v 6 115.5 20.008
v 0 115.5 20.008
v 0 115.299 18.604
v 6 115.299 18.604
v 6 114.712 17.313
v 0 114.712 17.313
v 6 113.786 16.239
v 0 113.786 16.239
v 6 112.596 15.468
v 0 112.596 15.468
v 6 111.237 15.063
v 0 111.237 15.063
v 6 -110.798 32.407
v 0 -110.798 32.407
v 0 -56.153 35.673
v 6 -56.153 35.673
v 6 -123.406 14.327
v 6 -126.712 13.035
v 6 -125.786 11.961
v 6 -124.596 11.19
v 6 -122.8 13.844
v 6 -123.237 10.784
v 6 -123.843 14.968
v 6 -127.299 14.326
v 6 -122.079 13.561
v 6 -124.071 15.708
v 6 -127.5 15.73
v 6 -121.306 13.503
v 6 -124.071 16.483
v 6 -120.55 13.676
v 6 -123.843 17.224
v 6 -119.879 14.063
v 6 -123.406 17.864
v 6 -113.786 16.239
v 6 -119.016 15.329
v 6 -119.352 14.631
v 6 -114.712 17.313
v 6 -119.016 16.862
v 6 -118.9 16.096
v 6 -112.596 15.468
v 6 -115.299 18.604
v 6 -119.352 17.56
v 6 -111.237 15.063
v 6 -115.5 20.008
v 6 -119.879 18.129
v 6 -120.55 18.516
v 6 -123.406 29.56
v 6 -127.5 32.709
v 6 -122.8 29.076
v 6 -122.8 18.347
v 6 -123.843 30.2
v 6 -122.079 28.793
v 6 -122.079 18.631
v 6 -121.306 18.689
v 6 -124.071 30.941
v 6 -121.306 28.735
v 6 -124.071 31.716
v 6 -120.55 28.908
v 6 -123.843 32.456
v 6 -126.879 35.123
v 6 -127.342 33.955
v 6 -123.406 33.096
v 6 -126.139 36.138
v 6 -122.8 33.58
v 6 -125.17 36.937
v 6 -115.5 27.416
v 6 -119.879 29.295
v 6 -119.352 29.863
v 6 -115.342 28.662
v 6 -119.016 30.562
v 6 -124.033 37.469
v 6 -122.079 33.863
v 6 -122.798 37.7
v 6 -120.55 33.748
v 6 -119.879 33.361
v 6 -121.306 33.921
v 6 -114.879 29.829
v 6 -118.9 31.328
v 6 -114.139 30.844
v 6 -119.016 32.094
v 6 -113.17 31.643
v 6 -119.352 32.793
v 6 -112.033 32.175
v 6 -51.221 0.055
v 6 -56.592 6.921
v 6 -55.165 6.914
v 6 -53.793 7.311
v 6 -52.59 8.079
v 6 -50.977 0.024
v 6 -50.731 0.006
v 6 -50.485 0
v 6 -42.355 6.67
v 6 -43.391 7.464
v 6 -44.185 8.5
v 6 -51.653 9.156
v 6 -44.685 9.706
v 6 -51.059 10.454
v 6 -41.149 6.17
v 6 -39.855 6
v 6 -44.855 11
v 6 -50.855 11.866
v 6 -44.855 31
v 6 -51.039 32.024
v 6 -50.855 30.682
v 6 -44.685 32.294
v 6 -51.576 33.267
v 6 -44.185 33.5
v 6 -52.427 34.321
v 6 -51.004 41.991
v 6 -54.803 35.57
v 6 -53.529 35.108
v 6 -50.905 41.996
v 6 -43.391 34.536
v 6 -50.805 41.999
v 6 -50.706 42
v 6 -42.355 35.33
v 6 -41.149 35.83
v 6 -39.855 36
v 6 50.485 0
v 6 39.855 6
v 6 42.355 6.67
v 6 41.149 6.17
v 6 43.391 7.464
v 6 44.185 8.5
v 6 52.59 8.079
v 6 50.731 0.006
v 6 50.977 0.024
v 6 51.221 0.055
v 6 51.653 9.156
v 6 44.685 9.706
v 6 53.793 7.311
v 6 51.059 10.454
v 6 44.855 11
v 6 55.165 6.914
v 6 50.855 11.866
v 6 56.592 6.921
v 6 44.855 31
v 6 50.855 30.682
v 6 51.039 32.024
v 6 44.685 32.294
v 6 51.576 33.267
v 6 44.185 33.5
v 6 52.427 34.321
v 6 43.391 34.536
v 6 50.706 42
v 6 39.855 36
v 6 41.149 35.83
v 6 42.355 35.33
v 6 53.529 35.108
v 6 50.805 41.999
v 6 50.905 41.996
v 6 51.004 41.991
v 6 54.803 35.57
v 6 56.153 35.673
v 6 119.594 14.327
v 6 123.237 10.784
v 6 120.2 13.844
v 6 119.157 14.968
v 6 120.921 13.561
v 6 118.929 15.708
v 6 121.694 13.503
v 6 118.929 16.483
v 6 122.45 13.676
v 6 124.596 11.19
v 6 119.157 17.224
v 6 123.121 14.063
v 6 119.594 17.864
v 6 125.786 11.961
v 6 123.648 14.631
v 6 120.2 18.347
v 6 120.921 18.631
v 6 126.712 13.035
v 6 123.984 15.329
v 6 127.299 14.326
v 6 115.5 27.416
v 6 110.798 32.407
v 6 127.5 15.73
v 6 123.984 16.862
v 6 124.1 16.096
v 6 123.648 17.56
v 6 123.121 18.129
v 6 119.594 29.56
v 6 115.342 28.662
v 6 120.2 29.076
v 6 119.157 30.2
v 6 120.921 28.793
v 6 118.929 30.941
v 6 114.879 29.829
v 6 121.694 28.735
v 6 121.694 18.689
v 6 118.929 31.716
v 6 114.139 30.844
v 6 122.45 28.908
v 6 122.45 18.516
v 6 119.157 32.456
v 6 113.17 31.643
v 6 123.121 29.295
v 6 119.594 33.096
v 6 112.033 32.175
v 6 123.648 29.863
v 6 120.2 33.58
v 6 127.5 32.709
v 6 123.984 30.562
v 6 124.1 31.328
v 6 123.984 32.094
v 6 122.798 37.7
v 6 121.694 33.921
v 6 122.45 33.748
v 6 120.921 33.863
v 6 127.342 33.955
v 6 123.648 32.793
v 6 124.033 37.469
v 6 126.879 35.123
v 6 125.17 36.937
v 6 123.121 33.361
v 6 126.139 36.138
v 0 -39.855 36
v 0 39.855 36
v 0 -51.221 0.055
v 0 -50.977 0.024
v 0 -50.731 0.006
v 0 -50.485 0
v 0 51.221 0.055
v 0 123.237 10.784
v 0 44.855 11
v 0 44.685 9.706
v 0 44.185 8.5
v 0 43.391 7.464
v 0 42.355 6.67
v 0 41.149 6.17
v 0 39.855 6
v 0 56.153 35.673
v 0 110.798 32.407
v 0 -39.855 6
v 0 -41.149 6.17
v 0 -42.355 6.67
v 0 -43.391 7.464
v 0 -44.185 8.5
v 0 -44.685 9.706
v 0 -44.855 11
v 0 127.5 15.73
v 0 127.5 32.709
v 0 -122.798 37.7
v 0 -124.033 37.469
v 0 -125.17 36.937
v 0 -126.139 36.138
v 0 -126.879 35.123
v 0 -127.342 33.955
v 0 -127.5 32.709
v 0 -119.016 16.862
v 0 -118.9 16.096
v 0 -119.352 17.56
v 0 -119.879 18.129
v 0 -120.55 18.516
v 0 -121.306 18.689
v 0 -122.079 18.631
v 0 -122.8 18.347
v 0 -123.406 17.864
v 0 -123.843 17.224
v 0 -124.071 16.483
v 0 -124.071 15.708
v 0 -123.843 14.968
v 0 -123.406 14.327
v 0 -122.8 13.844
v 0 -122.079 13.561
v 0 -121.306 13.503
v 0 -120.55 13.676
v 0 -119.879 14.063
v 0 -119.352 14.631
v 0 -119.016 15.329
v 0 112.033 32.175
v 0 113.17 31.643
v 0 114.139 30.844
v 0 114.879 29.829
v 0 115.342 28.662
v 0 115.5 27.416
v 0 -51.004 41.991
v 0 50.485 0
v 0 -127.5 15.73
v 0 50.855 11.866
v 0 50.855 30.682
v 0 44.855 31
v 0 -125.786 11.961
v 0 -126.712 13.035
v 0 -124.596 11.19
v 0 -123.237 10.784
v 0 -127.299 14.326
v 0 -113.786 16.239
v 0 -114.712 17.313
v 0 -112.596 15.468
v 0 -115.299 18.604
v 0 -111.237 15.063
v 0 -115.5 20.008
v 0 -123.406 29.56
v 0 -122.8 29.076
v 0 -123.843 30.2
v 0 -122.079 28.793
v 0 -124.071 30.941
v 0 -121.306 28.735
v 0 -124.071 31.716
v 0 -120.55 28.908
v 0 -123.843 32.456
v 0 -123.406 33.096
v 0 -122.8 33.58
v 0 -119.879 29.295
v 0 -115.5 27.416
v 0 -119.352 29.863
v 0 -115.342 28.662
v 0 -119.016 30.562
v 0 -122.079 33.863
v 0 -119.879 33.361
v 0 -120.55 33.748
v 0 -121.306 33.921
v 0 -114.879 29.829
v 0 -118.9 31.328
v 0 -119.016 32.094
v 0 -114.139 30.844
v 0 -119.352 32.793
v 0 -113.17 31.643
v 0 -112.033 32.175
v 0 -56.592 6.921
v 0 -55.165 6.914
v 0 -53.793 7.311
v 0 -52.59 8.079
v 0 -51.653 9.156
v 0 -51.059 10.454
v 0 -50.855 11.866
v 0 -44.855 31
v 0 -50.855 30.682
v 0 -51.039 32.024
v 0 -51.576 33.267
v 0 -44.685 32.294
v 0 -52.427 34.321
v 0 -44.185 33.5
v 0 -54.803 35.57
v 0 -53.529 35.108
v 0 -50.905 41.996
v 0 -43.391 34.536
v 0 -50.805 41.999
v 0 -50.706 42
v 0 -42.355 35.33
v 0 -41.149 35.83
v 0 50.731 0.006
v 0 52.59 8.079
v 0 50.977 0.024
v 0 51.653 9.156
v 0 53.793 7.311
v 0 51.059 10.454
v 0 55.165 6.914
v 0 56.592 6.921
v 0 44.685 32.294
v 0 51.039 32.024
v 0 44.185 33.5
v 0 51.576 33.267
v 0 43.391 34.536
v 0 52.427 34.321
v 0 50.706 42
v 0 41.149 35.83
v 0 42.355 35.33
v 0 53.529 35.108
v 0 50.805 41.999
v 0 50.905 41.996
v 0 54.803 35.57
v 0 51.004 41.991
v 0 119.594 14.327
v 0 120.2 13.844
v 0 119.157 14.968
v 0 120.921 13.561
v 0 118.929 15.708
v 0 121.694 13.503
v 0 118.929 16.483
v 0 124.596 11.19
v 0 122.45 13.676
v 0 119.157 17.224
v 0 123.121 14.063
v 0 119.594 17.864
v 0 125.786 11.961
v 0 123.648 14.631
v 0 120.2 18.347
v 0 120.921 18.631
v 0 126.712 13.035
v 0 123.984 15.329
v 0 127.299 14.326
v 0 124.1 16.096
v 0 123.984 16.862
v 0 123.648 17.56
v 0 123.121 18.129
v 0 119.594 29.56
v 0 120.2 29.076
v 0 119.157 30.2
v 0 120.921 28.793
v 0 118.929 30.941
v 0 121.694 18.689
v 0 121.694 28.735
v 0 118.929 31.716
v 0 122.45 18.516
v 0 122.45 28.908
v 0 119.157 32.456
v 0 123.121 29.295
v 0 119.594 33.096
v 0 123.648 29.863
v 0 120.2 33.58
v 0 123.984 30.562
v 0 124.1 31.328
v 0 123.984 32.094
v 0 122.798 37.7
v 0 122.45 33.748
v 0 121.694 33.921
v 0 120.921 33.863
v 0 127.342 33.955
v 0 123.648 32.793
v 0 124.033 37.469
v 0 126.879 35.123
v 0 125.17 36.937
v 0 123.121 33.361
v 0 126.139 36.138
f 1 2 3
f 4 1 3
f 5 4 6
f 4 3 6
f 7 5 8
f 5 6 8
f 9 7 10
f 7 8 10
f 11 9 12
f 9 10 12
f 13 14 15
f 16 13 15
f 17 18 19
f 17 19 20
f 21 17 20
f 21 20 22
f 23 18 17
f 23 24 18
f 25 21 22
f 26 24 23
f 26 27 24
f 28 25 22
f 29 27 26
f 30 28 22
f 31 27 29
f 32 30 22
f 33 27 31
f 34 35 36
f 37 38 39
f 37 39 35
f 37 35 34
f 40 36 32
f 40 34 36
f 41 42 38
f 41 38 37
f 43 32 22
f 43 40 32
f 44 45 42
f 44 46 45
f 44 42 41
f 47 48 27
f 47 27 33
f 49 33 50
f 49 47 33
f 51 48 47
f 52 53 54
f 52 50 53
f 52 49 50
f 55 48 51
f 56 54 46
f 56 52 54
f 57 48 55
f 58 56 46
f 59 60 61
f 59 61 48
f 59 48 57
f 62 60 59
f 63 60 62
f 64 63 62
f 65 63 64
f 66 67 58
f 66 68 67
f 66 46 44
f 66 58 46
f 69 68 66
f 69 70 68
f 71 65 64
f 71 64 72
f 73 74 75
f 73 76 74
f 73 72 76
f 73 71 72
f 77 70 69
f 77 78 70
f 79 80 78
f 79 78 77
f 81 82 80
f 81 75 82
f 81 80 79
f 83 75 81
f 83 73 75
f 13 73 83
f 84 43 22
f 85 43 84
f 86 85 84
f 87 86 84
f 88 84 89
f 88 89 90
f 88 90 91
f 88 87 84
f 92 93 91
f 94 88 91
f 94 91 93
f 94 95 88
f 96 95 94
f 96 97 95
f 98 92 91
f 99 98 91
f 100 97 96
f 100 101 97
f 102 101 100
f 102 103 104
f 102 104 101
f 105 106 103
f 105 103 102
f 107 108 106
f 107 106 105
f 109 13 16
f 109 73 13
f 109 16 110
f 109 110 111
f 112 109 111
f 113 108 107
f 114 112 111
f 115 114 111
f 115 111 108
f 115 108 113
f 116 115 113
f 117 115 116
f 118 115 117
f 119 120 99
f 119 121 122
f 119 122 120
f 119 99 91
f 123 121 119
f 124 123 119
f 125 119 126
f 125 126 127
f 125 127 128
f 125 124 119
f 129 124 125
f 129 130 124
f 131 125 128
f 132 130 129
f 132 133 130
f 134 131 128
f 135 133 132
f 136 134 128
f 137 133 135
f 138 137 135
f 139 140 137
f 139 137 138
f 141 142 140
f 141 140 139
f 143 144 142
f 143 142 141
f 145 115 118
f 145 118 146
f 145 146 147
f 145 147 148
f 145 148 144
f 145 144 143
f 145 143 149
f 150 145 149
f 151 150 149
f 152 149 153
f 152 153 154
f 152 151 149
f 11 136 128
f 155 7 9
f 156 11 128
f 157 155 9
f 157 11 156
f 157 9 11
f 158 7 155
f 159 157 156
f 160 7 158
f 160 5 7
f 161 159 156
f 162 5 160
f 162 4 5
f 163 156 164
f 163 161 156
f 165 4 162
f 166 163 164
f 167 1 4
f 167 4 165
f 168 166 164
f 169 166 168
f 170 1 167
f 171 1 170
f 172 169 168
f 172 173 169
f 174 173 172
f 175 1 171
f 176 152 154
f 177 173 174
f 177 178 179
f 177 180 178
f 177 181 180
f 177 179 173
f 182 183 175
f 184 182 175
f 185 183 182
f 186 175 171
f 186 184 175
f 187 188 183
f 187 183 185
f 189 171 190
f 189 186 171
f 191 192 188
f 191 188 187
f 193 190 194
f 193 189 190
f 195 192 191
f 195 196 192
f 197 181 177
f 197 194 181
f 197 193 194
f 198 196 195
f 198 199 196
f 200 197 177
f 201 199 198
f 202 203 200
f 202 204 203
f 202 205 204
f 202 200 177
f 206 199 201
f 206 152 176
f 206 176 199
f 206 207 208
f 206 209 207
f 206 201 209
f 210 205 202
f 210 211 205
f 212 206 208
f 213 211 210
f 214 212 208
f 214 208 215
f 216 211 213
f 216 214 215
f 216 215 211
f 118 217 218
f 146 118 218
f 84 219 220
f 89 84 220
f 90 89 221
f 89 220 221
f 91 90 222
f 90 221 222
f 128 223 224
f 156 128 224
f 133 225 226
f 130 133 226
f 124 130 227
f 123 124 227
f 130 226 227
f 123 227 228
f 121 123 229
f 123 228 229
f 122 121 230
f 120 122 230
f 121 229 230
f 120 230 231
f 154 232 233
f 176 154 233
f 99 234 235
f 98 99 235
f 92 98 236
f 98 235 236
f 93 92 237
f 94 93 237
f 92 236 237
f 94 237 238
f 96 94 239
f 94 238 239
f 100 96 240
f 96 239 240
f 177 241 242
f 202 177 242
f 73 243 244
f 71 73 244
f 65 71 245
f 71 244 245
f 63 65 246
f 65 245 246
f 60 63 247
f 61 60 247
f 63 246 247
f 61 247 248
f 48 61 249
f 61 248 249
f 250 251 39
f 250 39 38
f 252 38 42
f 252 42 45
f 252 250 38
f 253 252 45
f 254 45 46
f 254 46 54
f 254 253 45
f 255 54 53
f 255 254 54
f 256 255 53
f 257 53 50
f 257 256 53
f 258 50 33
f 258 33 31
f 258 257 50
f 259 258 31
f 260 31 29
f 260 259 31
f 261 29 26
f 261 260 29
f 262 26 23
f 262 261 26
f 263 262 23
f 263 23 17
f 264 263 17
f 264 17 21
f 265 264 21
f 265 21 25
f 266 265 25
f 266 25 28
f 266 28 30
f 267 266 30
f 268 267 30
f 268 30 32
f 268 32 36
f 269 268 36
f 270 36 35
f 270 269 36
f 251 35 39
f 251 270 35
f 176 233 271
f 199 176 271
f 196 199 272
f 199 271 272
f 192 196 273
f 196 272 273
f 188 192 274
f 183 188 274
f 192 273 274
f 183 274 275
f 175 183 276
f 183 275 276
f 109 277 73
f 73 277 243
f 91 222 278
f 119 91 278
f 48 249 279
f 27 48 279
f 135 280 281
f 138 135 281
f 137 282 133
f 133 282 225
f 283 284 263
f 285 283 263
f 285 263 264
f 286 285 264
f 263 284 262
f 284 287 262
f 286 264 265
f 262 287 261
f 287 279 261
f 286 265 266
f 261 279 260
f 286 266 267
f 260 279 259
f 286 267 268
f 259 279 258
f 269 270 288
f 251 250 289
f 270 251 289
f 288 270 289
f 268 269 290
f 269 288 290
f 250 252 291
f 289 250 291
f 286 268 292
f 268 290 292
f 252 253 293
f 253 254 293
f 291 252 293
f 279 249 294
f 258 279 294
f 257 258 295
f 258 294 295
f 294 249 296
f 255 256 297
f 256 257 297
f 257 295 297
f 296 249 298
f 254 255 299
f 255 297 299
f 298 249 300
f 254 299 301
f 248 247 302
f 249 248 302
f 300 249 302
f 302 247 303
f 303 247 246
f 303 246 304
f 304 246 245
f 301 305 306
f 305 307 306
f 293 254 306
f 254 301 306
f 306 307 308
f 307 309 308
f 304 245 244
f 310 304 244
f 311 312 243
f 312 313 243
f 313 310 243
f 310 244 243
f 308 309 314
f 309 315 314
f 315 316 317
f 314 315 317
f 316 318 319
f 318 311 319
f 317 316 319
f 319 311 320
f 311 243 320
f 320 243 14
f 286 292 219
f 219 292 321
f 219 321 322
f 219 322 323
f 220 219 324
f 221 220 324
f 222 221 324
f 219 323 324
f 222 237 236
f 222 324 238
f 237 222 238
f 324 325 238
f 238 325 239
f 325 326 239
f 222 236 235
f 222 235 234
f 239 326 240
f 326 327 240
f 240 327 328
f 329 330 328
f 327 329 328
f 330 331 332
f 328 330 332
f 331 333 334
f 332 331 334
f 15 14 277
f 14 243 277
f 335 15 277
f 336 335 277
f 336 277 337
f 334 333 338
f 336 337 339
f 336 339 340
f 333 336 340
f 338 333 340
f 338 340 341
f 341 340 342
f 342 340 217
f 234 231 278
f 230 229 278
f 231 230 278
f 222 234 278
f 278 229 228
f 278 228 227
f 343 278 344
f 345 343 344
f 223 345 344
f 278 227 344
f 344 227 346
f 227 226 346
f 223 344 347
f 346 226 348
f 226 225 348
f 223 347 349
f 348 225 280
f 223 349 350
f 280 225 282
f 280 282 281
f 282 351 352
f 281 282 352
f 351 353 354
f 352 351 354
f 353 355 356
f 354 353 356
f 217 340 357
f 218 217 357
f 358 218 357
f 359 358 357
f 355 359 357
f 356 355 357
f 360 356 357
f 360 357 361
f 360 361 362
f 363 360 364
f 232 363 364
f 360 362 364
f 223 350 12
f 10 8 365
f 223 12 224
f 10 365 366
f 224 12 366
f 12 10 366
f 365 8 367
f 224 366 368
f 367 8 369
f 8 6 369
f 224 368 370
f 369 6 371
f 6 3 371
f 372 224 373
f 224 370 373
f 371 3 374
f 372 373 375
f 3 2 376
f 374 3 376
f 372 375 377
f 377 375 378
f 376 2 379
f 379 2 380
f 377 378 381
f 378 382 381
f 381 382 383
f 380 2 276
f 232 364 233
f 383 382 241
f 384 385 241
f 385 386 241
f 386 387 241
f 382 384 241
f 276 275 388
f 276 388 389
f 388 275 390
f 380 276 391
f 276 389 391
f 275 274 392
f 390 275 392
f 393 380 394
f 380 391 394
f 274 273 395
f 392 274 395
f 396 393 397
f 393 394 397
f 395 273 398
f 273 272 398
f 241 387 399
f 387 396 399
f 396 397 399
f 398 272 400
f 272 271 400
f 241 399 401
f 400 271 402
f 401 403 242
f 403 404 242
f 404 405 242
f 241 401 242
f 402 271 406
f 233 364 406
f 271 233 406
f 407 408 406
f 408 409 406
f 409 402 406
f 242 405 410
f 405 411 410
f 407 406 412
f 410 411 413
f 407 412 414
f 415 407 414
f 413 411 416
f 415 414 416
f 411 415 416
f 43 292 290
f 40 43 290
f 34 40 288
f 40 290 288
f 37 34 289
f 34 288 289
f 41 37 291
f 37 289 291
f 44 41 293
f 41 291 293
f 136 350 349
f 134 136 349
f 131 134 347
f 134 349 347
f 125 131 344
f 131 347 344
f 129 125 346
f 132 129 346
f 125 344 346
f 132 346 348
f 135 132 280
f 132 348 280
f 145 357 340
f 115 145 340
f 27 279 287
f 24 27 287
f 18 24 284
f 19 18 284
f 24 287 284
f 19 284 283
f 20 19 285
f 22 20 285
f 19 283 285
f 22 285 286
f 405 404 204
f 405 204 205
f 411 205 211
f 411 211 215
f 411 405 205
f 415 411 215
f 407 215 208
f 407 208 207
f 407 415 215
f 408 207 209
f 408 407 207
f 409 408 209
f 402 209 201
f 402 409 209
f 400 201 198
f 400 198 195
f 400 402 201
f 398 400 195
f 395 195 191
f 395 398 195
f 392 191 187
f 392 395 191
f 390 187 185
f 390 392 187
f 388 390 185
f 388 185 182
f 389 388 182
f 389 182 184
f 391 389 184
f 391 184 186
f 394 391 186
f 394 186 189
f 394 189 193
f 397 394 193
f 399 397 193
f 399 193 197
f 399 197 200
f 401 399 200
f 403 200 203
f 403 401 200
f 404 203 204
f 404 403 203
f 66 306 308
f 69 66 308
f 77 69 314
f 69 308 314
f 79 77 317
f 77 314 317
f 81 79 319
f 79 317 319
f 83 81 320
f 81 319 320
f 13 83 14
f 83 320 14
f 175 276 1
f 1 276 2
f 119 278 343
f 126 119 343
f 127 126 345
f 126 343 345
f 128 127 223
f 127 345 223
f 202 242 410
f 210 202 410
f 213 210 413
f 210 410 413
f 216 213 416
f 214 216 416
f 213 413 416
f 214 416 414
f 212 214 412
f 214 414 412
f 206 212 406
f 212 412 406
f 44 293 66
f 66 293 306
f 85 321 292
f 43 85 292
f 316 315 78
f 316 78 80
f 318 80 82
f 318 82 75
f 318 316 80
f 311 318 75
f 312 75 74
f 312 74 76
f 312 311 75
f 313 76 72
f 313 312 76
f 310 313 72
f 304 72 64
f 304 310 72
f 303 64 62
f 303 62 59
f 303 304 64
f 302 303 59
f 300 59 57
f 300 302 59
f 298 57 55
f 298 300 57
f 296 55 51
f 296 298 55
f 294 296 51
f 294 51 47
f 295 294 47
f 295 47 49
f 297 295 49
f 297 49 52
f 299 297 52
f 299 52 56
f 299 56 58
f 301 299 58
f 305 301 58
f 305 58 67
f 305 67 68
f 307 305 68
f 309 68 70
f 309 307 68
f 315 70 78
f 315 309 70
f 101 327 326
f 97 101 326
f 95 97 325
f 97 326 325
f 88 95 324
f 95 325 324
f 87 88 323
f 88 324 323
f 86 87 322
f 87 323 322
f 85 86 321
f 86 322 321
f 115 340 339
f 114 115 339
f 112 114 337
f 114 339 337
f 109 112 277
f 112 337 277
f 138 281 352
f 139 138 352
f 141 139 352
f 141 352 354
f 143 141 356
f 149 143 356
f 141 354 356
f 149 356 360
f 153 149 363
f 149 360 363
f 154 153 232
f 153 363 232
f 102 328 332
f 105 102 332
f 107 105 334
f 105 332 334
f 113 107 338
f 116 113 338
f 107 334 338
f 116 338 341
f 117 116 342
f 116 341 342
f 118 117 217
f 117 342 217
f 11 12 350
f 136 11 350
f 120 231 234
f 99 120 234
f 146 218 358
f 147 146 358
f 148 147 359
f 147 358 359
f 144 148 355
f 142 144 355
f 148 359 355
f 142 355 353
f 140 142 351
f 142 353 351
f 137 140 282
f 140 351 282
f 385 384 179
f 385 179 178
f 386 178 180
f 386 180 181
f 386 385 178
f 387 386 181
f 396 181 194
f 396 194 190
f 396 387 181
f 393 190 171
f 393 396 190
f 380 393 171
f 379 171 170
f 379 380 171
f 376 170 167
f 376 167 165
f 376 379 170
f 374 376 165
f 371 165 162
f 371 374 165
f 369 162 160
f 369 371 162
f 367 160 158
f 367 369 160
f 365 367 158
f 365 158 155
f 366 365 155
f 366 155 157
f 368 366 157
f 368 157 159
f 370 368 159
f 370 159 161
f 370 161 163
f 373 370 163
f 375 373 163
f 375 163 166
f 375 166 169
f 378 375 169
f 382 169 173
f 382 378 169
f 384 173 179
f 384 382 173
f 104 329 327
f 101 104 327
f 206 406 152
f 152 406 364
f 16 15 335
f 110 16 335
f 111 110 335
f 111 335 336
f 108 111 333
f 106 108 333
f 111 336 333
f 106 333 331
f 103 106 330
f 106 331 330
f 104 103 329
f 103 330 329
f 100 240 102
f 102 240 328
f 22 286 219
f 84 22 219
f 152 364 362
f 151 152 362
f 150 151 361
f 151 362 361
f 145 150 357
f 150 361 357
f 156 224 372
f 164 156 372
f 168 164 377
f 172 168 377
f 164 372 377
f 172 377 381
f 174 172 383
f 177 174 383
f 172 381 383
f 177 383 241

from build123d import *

# Parameters (mm, degrees)
F0_R     = 2.6
F1_DEPTH = 6


with BuildPart() as f1:
    # F0 (on Right) → F1 (new body)
    with BuildSketch(Plane.YZ):
        with BuildLine():
            Line((-50.484604, 0), (0, 0))
            Line((0, 0), (50.484604, 0))
            ThreePointArc((50.484604, 0), (50.854025, 0.013666), (51.221427, 0.054589))
            Line((51.221427, 0.054589), (123.236823, 10.784256))
            ThreePointArc((123.236823, 10.784256), (126.287091, 12.465017), (127.5, 15.729667))
            Line((127.5, 15.729667), (127.5, 32.709328))
            ThreePointArc((127.5, 32.709328), (126.139466, 36.137781), (122.798285, 37.700423))
            Line((122.798285, 37.700423), (51.004047, 41.991095))
            ThreePointArc((51.004047, 41.991095), (50.854971, 41.997773), (50.705762, 42))
            Line((50.705762, 42), (39.15917, 42))
            Line((39.15917, 42), (-39.15917, 42))
            Line((-39.15917, 42), (-50.705762, 42))
            ThreePointArc((-50.705762, 42), (-50.854971, 41.997773), (-51.004047, 41.991095))
            Line((-51.004047, 41.991095), (-122.798285, 37.700423))
            ThreePointArc((-122.798285, 37.700423), (-126.139466, 36.137781), (-127.5, 32.709328))
            Line((-127.5, 32.709328), (-127.5, 15.729667))
            ThreePointArc((-127.5, 15.729667), (-126.287091, 12.465017), (-123.236823, 10.784256))
            Line((-123.236823, 10.784256), (-51.221427, 0.054589))
            ThreePointArc((-51.221427, 0.054589), (-50.854025, 0.013666), (-50.484604, 0))
        make_face()
        with Locations((-121.5, 16.095773)):
            Circle(F0_R, mode=Mode.SUBTRACT)
        with Locations((121.5, 16.095773)):
            Circle(F0_R, mode=Mode.SUBTRACT)
        with BuildLine():
            Line((-50.855038, 30.681556), (-50.855038, 11.866378))
            ThreePointArc((-50.855038, 11.866378), (-52.590387, 8.079287), (-56.591861, 6.920966))
            Line((-56.591861, 6.920966), (-111.236823, 15.06259))
            ThreePointArc((-111.236823, 15.06259), (-114.287091, 16.743351), (-115.5, 20.008001))
            Line((-115.5, 20.008001), (-115.5, 27.415784))
            ThreePointArc((-115.5, 27.415784), (-114.139466, 30.844237), (-110.798285, 32.406879))
            Line((-110.798285, 32.406879), (-56.153323, 35.672651))
            ThreePointArc((-56.153323, 35.672651), (-52.426585, 34.321022), (-50.855038, 30.681556))
        make_face(mode=Mode.SUBTRACT)
        with Locations((-121.5, 31.328013)):
            Circle(F0_R, mode=Mode.SUBTRACT)
        with BuildLine():
            ThreePointArc((-39.855038, 6), (-43.390572, 7.464466), (-44.855038, 11))
            Line((-44.855038, 11), (-44.855038, 31))
            ThreePointArc((-44.855038, 31), (-43.390572, 34.535534), (-39.855038, 36))
            Line((-39.855038, 36), (-39.15917, 36))
            Line((-39.15917, 36), (39.15917, 36))
            Line((39.15917, 36), (39.855038, 36))
            ThreePointArc((39.855038, 36), (43.390572, 34.535534), (44.855038, 31))
            Line((44.855038, 31), (44.855038, 11))
            ThreePointArc((44.855038, 11), (43.390572, 7.464466), (39.855038, 6))
            Line((39.855038, 6), (0, 6))
            Line((0, 6), (-39.855038, 6))
        make_face(mode=Mode.SUBTRACT)
        with BuildLine():
            Line((56.153323, 35.672651), (110.798285, 32.406879))
            ThreePointArc((110.798285, 32.406879), (114.139466, 30.844237), (115.5, 27.415784))
            Line((115.5, 27.415784), (115.5, 20.008001))
            ThreePointArc((115.5, 20.008001), (114.287091, 16.743351), (111.236823, 15.06259))
            Line((111.236823, 15.06259), (56.591861, 6.920966))
            ThreePointArc((56.591861, 6.920966), (52.590387, 8.079287), (50.855038, 11.866378))
            Line((50.855038, 11.866378), (50.855038, 30.681556))
            ThreePointArc((50.855038, 30.681556), (52.426585, 34.321022), (56.153323, 35.672651))
        make_face(mode=Mode.SUBTRACT)
        with Locations((121.5, 31.328013)):
            Circle(F0_R, mode=Mode.SUBTRACT)
    extrude(amount=F1_DEPTH)


solid = f1.part
